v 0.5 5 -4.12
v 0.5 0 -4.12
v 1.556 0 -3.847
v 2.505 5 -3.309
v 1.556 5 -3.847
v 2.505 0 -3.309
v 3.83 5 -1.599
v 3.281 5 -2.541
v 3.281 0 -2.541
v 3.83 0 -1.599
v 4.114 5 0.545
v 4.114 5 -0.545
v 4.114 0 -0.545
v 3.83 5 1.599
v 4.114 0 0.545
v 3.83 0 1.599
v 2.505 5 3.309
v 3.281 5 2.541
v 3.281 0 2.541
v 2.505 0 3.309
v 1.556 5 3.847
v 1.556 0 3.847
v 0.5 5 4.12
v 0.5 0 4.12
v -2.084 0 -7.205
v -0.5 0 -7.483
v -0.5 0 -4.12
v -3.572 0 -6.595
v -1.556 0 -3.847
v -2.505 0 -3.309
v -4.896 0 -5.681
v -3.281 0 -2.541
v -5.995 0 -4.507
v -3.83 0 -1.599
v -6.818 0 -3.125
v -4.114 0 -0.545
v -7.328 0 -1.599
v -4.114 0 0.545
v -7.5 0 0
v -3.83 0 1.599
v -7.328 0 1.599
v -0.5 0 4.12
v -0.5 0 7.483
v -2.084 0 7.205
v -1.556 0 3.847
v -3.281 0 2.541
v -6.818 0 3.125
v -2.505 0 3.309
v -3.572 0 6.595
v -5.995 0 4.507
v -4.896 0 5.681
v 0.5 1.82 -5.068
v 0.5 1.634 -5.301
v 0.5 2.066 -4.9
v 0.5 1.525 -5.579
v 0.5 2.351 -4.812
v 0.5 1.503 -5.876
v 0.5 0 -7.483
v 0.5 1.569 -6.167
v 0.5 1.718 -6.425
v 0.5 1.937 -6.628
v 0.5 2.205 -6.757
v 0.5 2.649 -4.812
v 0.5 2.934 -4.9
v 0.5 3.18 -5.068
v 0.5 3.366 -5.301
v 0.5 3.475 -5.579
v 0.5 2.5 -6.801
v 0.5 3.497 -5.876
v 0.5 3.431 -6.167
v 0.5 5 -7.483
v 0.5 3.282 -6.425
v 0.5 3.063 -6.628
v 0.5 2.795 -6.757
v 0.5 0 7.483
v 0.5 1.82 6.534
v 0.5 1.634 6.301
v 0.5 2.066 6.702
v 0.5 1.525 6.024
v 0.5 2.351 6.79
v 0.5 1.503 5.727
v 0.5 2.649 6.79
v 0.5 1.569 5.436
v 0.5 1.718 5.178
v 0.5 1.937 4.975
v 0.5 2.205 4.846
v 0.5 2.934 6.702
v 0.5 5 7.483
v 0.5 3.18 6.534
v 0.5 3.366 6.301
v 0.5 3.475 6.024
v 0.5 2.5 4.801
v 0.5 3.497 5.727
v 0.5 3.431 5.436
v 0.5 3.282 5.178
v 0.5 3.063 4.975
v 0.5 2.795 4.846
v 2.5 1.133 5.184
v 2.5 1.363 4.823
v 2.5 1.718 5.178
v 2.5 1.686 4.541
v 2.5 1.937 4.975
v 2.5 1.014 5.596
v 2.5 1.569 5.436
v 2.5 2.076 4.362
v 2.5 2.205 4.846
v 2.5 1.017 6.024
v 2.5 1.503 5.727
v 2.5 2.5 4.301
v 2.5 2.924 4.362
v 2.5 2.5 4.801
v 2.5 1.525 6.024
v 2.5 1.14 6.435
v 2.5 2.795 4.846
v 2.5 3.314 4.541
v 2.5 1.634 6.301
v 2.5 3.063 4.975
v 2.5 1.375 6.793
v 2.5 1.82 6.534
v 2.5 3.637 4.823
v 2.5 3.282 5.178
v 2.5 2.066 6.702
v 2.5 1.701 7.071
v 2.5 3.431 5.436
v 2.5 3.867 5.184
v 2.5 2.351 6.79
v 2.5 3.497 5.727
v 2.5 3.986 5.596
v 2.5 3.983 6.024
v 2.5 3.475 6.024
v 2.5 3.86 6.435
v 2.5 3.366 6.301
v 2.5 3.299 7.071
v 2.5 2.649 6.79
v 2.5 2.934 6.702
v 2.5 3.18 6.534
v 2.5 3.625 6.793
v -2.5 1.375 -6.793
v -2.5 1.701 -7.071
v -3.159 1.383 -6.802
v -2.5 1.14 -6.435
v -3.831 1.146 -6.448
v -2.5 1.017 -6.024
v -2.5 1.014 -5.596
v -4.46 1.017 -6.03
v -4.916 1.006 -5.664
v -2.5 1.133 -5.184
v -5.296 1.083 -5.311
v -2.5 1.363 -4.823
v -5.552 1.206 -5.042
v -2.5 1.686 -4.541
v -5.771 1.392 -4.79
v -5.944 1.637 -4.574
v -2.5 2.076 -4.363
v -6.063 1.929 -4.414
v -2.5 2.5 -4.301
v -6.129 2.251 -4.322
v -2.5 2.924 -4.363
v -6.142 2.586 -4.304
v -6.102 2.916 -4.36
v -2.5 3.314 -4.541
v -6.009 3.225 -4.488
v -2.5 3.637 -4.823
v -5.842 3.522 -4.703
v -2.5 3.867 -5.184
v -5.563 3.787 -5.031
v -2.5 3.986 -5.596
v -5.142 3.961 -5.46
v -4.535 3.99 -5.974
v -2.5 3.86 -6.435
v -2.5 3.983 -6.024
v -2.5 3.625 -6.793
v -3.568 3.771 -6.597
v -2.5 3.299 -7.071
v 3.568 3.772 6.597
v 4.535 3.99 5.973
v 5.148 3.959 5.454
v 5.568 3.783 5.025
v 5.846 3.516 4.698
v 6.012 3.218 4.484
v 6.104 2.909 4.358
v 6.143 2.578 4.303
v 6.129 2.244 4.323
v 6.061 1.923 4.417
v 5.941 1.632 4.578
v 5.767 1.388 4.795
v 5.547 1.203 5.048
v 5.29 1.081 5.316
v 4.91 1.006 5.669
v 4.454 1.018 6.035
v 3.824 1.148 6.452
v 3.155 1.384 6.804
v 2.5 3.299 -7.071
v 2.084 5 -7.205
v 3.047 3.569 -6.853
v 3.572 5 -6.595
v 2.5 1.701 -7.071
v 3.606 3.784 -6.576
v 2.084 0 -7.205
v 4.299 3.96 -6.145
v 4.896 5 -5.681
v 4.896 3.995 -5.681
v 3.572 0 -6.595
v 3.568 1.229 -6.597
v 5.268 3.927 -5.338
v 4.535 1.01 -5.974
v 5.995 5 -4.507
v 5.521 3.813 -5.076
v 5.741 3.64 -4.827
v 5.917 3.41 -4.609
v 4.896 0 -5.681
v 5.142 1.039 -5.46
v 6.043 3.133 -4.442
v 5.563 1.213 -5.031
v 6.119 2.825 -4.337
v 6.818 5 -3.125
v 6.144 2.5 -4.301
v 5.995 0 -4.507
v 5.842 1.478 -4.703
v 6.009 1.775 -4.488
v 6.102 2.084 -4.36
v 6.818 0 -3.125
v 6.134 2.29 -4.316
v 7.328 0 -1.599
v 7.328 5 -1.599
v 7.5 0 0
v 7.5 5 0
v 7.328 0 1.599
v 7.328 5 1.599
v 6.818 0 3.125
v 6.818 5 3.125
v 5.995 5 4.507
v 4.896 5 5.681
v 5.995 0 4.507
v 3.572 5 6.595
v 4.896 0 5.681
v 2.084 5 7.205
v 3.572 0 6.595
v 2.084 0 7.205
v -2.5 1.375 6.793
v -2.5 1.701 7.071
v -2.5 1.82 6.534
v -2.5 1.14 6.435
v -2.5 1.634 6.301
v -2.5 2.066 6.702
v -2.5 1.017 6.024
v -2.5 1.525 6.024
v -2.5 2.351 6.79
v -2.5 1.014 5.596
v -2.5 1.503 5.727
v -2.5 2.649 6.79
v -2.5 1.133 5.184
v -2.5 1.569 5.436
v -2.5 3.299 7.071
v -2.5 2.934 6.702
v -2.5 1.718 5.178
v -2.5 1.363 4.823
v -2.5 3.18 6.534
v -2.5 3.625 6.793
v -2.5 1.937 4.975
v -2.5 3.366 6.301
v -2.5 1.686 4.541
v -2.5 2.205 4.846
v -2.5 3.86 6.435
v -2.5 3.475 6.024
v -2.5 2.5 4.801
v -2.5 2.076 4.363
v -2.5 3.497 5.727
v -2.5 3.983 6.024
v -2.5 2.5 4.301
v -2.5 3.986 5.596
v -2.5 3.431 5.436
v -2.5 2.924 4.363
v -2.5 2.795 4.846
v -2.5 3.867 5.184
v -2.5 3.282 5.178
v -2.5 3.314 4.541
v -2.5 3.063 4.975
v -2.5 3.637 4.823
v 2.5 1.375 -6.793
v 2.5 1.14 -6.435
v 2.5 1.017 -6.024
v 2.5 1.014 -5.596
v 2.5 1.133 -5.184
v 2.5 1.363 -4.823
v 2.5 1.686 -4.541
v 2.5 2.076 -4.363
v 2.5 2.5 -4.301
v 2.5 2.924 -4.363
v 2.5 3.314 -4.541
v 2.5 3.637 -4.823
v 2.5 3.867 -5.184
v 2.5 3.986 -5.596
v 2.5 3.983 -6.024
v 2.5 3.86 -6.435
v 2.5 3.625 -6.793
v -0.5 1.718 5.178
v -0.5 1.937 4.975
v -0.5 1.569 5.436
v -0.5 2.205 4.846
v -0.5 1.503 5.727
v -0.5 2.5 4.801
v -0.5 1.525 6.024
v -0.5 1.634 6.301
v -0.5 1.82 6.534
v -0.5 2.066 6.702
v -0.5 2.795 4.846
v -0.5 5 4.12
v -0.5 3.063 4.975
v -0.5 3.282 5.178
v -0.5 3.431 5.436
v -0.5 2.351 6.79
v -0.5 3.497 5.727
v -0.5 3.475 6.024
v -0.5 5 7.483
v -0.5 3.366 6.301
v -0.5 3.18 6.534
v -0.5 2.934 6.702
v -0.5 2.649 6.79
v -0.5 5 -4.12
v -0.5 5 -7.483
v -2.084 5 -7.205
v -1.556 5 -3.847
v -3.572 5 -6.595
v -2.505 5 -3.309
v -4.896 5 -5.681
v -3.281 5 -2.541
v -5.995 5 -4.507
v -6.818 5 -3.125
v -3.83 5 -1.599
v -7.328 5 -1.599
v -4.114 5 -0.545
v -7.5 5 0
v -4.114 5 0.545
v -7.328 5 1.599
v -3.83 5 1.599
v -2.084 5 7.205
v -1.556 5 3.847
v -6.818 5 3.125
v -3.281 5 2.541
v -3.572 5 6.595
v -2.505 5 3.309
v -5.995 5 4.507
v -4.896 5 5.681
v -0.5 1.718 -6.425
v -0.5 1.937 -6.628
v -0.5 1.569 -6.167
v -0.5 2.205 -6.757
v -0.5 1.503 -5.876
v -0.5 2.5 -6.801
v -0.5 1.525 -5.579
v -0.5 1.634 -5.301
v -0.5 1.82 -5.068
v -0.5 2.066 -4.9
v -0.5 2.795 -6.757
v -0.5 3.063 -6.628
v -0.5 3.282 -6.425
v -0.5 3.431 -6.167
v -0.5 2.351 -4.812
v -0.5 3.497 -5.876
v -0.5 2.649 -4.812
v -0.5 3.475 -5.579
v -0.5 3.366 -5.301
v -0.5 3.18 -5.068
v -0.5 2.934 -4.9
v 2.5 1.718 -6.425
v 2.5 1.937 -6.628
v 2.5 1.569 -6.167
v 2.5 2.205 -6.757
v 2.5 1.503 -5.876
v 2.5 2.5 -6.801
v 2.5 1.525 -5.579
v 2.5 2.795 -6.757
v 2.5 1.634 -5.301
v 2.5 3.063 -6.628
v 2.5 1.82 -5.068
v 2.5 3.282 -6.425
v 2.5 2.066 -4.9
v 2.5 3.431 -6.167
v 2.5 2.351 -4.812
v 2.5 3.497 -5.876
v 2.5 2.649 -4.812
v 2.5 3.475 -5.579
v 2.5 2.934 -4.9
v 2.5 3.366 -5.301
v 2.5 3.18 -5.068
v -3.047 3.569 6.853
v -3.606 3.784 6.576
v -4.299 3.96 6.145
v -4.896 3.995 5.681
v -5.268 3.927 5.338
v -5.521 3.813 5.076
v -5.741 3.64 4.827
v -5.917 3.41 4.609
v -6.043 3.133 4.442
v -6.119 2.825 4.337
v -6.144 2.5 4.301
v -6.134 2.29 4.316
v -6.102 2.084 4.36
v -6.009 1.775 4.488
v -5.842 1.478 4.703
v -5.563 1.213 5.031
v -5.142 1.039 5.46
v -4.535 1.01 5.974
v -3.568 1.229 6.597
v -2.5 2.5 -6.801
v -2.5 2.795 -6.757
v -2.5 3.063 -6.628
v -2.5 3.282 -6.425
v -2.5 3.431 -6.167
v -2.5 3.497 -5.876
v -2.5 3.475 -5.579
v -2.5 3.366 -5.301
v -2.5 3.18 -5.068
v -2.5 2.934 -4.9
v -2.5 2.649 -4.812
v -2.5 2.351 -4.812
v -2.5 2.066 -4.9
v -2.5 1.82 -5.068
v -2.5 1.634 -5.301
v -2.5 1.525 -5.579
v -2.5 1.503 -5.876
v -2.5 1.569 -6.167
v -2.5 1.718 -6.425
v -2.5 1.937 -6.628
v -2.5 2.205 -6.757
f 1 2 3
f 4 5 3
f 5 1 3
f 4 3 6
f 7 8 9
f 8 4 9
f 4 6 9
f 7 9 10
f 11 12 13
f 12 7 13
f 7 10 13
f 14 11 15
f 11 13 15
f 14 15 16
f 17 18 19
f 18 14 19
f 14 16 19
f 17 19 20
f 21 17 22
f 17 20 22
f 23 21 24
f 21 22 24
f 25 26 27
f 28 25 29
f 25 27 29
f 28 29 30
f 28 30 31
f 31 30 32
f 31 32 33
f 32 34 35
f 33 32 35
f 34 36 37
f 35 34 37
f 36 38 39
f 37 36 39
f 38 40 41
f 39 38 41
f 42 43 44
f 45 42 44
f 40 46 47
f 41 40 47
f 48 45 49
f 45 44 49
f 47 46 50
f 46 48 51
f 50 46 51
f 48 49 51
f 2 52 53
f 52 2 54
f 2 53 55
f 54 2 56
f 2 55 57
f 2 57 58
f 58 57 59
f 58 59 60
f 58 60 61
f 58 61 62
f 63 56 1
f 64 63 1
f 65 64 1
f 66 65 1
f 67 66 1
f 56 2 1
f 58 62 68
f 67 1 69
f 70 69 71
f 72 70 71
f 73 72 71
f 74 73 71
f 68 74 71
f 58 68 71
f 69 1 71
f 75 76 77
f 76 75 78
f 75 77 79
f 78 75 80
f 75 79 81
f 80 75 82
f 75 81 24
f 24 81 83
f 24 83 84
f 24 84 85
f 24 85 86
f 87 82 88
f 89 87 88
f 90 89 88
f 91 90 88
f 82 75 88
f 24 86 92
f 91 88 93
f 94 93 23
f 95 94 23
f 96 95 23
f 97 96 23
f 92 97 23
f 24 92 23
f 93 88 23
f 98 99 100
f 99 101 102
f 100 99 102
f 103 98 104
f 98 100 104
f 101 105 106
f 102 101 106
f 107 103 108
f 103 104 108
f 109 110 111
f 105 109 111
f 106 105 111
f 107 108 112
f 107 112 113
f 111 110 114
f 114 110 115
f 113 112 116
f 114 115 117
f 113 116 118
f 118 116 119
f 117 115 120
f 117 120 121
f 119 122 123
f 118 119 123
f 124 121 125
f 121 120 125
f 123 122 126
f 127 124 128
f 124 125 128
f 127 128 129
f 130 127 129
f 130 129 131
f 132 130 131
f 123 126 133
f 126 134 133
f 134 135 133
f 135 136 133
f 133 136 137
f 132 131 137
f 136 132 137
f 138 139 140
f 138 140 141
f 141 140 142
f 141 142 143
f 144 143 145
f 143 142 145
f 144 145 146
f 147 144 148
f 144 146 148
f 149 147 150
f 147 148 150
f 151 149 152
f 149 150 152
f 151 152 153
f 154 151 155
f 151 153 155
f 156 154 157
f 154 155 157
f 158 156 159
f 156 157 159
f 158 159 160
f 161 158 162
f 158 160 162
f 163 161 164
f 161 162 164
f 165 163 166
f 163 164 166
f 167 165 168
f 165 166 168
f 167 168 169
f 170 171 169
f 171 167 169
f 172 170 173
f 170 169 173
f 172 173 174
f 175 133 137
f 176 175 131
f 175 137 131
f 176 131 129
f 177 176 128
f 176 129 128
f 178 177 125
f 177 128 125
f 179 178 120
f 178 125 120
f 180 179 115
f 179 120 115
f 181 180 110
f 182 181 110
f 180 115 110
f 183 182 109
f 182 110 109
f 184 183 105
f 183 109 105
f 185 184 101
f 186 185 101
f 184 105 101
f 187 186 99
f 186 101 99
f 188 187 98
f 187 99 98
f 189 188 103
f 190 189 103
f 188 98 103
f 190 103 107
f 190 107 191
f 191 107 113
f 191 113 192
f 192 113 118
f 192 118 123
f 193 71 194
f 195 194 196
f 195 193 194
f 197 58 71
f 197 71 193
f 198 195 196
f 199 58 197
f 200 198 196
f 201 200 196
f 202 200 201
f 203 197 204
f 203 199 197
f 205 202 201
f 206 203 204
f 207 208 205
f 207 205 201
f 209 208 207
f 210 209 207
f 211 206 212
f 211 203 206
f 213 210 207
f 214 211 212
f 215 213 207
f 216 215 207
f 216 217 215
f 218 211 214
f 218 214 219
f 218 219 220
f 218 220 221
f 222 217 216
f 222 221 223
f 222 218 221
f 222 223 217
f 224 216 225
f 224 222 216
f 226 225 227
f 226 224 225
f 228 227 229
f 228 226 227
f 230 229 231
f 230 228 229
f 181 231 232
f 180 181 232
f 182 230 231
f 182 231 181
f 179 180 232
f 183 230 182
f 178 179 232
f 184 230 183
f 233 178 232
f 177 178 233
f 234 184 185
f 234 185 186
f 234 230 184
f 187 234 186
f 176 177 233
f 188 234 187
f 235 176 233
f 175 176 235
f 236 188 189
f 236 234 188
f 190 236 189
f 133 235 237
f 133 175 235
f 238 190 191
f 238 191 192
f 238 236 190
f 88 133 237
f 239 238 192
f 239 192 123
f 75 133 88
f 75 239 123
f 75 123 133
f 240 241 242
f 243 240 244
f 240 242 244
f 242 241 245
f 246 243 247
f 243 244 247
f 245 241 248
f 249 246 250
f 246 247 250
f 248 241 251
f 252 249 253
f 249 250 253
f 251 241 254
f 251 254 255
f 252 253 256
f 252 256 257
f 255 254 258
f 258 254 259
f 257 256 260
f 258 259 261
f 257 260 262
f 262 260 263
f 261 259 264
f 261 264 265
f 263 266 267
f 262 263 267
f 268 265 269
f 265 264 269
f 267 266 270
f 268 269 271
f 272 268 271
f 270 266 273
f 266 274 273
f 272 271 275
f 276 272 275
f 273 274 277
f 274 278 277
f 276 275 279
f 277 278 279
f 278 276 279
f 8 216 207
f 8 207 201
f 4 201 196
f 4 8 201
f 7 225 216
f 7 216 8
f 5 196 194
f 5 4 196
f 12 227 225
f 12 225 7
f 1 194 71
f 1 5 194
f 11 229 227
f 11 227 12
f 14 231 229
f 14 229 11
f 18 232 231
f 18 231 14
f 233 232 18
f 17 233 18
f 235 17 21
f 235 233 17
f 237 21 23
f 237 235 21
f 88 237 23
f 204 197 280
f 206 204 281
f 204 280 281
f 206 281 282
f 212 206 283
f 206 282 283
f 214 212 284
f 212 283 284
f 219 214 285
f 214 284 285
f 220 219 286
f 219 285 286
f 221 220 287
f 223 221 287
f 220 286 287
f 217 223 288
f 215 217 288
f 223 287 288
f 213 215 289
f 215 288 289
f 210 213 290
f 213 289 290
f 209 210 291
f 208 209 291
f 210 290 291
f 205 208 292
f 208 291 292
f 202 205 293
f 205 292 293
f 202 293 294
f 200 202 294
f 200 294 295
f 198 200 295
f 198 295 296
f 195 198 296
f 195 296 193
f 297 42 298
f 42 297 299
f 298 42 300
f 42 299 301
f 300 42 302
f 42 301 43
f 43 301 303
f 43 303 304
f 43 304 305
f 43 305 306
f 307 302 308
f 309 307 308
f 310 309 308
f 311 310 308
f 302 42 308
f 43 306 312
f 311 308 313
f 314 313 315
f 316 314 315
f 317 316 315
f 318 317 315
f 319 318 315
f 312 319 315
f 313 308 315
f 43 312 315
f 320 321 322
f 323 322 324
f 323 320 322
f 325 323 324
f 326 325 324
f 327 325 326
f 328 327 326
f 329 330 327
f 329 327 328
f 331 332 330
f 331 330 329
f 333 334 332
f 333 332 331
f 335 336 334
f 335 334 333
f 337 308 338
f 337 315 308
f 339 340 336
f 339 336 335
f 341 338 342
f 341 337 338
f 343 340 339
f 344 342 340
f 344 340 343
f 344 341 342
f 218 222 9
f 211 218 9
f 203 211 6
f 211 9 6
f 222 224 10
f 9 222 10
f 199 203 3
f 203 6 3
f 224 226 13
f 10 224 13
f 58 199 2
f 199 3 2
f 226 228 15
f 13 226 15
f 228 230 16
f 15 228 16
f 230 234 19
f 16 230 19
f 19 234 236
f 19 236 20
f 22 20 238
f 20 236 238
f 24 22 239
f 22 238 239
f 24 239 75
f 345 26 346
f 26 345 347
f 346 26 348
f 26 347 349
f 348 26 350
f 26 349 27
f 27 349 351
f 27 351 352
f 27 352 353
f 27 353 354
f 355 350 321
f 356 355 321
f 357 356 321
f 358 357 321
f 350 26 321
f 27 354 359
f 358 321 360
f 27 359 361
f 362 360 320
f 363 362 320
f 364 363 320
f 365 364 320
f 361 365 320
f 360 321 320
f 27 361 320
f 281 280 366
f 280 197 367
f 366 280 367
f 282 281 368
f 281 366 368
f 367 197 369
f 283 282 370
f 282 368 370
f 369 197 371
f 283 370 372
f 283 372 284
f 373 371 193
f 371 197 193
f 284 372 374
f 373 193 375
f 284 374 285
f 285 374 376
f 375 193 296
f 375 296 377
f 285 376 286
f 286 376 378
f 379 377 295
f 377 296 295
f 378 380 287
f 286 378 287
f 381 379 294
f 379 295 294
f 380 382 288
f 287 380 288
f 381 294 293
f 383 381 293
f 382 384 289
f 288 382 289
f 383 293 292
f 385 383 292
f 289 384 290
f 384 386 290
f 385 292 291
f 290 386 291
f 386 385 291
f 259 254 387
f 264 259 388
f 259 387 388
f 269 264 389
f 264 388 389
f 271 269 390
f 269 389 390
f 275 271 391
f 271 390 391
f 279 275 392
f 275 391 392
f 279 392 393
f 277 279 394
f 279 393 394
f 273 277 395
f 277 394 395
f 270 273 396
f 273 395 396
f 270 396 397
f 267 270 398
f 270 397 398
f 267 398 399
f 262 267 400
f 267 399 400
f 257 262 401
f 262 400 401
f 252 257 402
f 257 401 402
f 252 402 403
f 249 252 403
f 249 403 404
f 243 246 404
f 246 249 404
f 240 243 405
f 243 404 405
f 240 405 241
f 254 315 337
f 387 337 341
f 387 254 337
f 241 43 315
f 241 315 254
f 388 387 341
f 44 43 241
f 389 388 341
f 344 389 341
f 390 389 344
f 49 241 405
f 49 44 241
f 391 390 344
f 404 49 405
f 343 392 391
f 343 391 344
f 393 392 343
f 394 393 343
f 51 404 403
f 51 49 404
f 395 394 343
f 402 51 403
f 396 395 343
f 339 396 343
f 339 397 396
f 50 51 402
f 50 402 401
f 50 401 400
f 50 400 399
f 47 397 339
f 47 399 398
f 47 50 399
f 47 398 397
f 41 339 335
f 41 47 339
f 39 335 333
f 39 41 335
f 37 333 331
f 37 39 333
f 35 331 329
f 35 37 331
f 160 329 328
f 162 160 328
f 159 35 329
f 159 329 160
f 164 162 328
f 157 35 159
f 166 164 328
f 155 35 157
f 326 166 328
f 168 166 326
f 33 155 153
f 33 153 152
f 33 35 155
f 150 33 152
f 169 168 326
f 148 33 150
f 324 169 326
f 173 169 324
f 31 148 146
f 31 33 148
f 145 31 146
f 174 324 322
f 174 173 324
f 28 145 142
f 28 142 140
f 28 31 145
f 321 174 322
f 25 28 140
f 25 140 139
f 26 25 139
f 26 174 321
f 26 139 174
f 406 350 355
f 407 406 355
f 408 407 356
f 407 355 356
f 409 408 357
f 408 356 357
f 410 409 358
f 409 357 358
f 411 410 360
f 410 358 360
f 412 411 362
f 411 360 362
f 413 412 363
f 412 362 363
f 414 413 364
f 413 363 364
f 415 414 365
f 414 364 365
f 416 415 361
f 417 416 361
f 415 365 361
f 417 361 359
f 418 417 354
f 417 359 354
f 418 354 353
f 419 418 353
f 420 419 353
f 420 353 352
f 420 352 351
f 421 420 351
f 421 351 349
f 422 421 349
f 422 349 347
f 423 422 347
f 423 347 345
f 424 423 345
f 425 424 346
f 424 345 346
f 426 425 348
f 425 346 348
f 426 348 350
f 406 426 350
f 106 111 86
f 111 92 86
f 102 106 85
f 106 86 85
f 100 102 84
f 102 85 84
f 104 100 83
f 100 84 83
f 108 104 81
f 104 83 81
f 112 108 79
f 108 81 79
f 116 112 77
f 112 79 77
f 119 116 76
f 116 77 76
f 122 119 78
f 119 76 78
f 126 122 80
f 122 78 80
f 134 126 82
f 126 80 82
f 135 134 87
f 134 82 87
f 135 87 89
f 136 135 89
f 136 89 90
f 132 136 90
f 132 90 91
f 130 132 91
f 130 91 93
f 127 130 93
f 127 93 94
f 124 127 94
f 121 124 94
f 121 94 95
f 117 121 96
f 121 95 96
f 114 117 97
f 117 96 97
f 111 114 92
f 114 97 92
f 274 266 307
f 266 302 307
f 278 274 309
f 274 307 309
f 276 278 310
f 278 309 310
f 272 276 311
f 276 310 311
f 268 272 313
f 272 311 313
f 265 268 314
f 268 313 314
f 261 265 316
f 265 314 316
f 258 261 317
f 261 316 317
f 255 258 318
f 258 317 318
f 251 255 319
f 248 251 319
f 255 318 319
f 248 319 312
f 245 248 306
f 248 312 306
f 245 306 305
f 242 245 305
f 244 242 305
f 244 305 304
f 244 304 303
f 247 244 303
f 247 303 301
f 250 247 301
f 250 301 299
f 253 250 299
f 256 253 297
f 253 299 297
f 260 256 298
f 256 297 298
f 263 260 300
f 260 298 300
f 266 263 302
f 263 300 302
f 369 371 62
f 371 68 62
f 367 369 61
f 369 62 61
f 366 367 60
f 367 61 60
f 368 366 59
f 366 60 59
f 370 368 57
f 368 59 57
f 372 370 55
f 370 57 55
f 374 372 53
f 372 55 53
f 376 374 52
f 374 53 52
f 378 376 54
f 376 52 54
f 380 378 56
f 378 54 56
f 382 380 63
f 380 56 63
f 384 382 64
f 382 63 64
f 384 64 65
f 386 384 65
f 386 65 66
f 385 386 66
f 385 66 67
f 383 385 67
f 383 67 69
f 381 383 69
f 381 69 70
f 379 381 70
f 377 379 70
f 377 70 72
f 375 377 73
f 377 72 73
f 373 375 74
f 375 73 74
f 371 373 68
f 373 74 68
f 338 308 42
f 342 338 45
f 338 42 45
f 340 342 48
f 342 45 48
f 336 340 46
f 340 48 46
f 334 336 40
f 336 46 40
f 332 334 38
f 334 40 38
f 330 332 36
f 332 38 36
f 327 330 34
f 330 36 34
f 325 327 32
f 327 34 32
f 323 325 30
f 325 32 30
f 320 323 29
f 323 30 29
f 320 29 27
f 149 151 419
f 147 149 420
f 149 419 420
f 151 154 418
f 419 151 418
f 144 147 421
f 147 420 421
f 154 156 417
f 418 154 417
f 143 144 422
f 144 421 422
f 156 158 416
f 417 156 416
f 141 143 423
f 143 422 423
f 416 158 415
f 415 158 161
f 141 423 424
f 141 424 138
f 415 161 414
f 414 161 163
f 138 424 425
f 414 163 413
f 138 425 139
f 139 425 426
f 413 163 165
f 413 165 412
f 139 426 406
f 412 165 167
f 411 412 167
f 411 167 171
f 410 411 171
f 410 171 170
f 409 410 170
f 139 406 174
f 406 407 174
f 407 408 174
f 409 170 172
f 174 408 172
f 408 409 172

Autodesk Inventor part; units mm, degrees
ref_plane "YZ Plane" through (0, 0, 0) normal (1, 0, 0) x (0, 1, 0)
ref_plane "XZ Plane" through (0, 0, 0) normal (0, 1, 0) x (-1, 0, 0)
ref_plane "XY Plane" through (0, 0, 0) normal (0, 0, 1) x (1, 0, 0)
sketch "Sketch1" plane through (0, 0, 0) normal (0, 1, 0) x (-1, 0, 0)
  circle A0 centre (0, 0) radius 4.15
  circle A1 centre (0, 0) radius 7.5
  dimension "d0" = 8.3
  dimension "d1" = 15
extrude "Extrusion1" add sketch "Sketch1" along normal blind 5
sketch "Sketch2" plane through (0, 5, 0) normal (0, 1, 0) x (1, 0, 0)
  line L0 (-0.5, -8.297) -> (0.5, -8.297)
  line L1 (0.5, -8.297) -> (0.5, 8.8641)
  line L2 (0.5, 8.8641) -> (-0.5, 8.8641)
  line L3 (-0.5, 8.8641) -> (-0.5, -8.297)
  point P0 (0, 0)
  dimension "d4" = 1
  dimension "d5" = 0.5
extrude "Extrusion2" cut sketch "Sketch2" against normal blind 5
sketch "Sketch3" plane through (-0.5, 5, -4.1198) normal (1, 0, 0) x (0, 0, -1)
  circle A0 centre (1.6815, -2.5) radius 1
  line L0 (3.3635, -5) -> (3.3635, 0) projected
  line L1 (3.3635, -5) -> (-11.6031, -5) projected
  circle A1 centre (-9.9211, -2.5) radius 1
  line L2 (3.3635, 0) -> (-11.6031, 0) projected
  line L3 (-11.6031, 0) -> (-11.6031, -5) projected
  point P0 (-4.1198, -5)
  dimension "d8" = 2
  dimension "d9" = 1.682
  dimension "d10" = 2.5
  dimension "d11" = 2
  dimension "d12" = 2.5
  dimension "d13" = 1.682
extrude "Extrusion3" cut sketch "Sketch3" along normal mid plane 20 contours A0 | A1
ref_plane "Work Plane1" through (-10.5, 5, -4.1198) normal (1, 0, 0) x (0, 0, -1)
sketch "Sketch4" plane through (-10.5, 5, -4.1198) normal (1, 0, 0) x (0, 0, -1)
  circle A0 centre (1.6815, -2.5) radius 1.5
  circle A1 centre (-9.9211, -2.5) radius 1.5
  circle A2 centre (-9.9211, -2.5) radius 1 projected
  circle A3 centre (1.6815, -2.5) radius 1 projected
  point P0 (-4.1198, -5)
  dimension "d17" = 3
  dimension "d18" = 3
extrude "Extrusion4" cut sketch "Sketch4" along normal blind 8 contours A0 | A1 | A2 | A3
ref_plane "Work Plane2" through (2.5, 5, 4.1198) normal (-1, 0, 0) x (0, 0, 1)
sketch "Sketch6" plane through (2.5, 5, 4.1198) normal (-1, 0, 0) x (0, 0, 1)
  arc A0 (2.9513, -1.7014) -> (2.9513, -3.2986) centre (1.6815, -2.5) ccw projected
  circle A1 centre (1.6815, -2.5) radius 1.5
  circle A2 centre (-9.9211, -2.5) radius 1 projected
  circle A3 centre (-9.9211, -2.5) radius 1.5
  point P0 (-4.1198, -5)
  point P1 (2.9513, -3.2986)
  dimension "d31" = 3
  dimension "d32" = 3
extrude "Extrusion6" cut sketch "Sketch6" against normal blind 10 contours A1 A0 | A2 | A3
properties part number "collar"
